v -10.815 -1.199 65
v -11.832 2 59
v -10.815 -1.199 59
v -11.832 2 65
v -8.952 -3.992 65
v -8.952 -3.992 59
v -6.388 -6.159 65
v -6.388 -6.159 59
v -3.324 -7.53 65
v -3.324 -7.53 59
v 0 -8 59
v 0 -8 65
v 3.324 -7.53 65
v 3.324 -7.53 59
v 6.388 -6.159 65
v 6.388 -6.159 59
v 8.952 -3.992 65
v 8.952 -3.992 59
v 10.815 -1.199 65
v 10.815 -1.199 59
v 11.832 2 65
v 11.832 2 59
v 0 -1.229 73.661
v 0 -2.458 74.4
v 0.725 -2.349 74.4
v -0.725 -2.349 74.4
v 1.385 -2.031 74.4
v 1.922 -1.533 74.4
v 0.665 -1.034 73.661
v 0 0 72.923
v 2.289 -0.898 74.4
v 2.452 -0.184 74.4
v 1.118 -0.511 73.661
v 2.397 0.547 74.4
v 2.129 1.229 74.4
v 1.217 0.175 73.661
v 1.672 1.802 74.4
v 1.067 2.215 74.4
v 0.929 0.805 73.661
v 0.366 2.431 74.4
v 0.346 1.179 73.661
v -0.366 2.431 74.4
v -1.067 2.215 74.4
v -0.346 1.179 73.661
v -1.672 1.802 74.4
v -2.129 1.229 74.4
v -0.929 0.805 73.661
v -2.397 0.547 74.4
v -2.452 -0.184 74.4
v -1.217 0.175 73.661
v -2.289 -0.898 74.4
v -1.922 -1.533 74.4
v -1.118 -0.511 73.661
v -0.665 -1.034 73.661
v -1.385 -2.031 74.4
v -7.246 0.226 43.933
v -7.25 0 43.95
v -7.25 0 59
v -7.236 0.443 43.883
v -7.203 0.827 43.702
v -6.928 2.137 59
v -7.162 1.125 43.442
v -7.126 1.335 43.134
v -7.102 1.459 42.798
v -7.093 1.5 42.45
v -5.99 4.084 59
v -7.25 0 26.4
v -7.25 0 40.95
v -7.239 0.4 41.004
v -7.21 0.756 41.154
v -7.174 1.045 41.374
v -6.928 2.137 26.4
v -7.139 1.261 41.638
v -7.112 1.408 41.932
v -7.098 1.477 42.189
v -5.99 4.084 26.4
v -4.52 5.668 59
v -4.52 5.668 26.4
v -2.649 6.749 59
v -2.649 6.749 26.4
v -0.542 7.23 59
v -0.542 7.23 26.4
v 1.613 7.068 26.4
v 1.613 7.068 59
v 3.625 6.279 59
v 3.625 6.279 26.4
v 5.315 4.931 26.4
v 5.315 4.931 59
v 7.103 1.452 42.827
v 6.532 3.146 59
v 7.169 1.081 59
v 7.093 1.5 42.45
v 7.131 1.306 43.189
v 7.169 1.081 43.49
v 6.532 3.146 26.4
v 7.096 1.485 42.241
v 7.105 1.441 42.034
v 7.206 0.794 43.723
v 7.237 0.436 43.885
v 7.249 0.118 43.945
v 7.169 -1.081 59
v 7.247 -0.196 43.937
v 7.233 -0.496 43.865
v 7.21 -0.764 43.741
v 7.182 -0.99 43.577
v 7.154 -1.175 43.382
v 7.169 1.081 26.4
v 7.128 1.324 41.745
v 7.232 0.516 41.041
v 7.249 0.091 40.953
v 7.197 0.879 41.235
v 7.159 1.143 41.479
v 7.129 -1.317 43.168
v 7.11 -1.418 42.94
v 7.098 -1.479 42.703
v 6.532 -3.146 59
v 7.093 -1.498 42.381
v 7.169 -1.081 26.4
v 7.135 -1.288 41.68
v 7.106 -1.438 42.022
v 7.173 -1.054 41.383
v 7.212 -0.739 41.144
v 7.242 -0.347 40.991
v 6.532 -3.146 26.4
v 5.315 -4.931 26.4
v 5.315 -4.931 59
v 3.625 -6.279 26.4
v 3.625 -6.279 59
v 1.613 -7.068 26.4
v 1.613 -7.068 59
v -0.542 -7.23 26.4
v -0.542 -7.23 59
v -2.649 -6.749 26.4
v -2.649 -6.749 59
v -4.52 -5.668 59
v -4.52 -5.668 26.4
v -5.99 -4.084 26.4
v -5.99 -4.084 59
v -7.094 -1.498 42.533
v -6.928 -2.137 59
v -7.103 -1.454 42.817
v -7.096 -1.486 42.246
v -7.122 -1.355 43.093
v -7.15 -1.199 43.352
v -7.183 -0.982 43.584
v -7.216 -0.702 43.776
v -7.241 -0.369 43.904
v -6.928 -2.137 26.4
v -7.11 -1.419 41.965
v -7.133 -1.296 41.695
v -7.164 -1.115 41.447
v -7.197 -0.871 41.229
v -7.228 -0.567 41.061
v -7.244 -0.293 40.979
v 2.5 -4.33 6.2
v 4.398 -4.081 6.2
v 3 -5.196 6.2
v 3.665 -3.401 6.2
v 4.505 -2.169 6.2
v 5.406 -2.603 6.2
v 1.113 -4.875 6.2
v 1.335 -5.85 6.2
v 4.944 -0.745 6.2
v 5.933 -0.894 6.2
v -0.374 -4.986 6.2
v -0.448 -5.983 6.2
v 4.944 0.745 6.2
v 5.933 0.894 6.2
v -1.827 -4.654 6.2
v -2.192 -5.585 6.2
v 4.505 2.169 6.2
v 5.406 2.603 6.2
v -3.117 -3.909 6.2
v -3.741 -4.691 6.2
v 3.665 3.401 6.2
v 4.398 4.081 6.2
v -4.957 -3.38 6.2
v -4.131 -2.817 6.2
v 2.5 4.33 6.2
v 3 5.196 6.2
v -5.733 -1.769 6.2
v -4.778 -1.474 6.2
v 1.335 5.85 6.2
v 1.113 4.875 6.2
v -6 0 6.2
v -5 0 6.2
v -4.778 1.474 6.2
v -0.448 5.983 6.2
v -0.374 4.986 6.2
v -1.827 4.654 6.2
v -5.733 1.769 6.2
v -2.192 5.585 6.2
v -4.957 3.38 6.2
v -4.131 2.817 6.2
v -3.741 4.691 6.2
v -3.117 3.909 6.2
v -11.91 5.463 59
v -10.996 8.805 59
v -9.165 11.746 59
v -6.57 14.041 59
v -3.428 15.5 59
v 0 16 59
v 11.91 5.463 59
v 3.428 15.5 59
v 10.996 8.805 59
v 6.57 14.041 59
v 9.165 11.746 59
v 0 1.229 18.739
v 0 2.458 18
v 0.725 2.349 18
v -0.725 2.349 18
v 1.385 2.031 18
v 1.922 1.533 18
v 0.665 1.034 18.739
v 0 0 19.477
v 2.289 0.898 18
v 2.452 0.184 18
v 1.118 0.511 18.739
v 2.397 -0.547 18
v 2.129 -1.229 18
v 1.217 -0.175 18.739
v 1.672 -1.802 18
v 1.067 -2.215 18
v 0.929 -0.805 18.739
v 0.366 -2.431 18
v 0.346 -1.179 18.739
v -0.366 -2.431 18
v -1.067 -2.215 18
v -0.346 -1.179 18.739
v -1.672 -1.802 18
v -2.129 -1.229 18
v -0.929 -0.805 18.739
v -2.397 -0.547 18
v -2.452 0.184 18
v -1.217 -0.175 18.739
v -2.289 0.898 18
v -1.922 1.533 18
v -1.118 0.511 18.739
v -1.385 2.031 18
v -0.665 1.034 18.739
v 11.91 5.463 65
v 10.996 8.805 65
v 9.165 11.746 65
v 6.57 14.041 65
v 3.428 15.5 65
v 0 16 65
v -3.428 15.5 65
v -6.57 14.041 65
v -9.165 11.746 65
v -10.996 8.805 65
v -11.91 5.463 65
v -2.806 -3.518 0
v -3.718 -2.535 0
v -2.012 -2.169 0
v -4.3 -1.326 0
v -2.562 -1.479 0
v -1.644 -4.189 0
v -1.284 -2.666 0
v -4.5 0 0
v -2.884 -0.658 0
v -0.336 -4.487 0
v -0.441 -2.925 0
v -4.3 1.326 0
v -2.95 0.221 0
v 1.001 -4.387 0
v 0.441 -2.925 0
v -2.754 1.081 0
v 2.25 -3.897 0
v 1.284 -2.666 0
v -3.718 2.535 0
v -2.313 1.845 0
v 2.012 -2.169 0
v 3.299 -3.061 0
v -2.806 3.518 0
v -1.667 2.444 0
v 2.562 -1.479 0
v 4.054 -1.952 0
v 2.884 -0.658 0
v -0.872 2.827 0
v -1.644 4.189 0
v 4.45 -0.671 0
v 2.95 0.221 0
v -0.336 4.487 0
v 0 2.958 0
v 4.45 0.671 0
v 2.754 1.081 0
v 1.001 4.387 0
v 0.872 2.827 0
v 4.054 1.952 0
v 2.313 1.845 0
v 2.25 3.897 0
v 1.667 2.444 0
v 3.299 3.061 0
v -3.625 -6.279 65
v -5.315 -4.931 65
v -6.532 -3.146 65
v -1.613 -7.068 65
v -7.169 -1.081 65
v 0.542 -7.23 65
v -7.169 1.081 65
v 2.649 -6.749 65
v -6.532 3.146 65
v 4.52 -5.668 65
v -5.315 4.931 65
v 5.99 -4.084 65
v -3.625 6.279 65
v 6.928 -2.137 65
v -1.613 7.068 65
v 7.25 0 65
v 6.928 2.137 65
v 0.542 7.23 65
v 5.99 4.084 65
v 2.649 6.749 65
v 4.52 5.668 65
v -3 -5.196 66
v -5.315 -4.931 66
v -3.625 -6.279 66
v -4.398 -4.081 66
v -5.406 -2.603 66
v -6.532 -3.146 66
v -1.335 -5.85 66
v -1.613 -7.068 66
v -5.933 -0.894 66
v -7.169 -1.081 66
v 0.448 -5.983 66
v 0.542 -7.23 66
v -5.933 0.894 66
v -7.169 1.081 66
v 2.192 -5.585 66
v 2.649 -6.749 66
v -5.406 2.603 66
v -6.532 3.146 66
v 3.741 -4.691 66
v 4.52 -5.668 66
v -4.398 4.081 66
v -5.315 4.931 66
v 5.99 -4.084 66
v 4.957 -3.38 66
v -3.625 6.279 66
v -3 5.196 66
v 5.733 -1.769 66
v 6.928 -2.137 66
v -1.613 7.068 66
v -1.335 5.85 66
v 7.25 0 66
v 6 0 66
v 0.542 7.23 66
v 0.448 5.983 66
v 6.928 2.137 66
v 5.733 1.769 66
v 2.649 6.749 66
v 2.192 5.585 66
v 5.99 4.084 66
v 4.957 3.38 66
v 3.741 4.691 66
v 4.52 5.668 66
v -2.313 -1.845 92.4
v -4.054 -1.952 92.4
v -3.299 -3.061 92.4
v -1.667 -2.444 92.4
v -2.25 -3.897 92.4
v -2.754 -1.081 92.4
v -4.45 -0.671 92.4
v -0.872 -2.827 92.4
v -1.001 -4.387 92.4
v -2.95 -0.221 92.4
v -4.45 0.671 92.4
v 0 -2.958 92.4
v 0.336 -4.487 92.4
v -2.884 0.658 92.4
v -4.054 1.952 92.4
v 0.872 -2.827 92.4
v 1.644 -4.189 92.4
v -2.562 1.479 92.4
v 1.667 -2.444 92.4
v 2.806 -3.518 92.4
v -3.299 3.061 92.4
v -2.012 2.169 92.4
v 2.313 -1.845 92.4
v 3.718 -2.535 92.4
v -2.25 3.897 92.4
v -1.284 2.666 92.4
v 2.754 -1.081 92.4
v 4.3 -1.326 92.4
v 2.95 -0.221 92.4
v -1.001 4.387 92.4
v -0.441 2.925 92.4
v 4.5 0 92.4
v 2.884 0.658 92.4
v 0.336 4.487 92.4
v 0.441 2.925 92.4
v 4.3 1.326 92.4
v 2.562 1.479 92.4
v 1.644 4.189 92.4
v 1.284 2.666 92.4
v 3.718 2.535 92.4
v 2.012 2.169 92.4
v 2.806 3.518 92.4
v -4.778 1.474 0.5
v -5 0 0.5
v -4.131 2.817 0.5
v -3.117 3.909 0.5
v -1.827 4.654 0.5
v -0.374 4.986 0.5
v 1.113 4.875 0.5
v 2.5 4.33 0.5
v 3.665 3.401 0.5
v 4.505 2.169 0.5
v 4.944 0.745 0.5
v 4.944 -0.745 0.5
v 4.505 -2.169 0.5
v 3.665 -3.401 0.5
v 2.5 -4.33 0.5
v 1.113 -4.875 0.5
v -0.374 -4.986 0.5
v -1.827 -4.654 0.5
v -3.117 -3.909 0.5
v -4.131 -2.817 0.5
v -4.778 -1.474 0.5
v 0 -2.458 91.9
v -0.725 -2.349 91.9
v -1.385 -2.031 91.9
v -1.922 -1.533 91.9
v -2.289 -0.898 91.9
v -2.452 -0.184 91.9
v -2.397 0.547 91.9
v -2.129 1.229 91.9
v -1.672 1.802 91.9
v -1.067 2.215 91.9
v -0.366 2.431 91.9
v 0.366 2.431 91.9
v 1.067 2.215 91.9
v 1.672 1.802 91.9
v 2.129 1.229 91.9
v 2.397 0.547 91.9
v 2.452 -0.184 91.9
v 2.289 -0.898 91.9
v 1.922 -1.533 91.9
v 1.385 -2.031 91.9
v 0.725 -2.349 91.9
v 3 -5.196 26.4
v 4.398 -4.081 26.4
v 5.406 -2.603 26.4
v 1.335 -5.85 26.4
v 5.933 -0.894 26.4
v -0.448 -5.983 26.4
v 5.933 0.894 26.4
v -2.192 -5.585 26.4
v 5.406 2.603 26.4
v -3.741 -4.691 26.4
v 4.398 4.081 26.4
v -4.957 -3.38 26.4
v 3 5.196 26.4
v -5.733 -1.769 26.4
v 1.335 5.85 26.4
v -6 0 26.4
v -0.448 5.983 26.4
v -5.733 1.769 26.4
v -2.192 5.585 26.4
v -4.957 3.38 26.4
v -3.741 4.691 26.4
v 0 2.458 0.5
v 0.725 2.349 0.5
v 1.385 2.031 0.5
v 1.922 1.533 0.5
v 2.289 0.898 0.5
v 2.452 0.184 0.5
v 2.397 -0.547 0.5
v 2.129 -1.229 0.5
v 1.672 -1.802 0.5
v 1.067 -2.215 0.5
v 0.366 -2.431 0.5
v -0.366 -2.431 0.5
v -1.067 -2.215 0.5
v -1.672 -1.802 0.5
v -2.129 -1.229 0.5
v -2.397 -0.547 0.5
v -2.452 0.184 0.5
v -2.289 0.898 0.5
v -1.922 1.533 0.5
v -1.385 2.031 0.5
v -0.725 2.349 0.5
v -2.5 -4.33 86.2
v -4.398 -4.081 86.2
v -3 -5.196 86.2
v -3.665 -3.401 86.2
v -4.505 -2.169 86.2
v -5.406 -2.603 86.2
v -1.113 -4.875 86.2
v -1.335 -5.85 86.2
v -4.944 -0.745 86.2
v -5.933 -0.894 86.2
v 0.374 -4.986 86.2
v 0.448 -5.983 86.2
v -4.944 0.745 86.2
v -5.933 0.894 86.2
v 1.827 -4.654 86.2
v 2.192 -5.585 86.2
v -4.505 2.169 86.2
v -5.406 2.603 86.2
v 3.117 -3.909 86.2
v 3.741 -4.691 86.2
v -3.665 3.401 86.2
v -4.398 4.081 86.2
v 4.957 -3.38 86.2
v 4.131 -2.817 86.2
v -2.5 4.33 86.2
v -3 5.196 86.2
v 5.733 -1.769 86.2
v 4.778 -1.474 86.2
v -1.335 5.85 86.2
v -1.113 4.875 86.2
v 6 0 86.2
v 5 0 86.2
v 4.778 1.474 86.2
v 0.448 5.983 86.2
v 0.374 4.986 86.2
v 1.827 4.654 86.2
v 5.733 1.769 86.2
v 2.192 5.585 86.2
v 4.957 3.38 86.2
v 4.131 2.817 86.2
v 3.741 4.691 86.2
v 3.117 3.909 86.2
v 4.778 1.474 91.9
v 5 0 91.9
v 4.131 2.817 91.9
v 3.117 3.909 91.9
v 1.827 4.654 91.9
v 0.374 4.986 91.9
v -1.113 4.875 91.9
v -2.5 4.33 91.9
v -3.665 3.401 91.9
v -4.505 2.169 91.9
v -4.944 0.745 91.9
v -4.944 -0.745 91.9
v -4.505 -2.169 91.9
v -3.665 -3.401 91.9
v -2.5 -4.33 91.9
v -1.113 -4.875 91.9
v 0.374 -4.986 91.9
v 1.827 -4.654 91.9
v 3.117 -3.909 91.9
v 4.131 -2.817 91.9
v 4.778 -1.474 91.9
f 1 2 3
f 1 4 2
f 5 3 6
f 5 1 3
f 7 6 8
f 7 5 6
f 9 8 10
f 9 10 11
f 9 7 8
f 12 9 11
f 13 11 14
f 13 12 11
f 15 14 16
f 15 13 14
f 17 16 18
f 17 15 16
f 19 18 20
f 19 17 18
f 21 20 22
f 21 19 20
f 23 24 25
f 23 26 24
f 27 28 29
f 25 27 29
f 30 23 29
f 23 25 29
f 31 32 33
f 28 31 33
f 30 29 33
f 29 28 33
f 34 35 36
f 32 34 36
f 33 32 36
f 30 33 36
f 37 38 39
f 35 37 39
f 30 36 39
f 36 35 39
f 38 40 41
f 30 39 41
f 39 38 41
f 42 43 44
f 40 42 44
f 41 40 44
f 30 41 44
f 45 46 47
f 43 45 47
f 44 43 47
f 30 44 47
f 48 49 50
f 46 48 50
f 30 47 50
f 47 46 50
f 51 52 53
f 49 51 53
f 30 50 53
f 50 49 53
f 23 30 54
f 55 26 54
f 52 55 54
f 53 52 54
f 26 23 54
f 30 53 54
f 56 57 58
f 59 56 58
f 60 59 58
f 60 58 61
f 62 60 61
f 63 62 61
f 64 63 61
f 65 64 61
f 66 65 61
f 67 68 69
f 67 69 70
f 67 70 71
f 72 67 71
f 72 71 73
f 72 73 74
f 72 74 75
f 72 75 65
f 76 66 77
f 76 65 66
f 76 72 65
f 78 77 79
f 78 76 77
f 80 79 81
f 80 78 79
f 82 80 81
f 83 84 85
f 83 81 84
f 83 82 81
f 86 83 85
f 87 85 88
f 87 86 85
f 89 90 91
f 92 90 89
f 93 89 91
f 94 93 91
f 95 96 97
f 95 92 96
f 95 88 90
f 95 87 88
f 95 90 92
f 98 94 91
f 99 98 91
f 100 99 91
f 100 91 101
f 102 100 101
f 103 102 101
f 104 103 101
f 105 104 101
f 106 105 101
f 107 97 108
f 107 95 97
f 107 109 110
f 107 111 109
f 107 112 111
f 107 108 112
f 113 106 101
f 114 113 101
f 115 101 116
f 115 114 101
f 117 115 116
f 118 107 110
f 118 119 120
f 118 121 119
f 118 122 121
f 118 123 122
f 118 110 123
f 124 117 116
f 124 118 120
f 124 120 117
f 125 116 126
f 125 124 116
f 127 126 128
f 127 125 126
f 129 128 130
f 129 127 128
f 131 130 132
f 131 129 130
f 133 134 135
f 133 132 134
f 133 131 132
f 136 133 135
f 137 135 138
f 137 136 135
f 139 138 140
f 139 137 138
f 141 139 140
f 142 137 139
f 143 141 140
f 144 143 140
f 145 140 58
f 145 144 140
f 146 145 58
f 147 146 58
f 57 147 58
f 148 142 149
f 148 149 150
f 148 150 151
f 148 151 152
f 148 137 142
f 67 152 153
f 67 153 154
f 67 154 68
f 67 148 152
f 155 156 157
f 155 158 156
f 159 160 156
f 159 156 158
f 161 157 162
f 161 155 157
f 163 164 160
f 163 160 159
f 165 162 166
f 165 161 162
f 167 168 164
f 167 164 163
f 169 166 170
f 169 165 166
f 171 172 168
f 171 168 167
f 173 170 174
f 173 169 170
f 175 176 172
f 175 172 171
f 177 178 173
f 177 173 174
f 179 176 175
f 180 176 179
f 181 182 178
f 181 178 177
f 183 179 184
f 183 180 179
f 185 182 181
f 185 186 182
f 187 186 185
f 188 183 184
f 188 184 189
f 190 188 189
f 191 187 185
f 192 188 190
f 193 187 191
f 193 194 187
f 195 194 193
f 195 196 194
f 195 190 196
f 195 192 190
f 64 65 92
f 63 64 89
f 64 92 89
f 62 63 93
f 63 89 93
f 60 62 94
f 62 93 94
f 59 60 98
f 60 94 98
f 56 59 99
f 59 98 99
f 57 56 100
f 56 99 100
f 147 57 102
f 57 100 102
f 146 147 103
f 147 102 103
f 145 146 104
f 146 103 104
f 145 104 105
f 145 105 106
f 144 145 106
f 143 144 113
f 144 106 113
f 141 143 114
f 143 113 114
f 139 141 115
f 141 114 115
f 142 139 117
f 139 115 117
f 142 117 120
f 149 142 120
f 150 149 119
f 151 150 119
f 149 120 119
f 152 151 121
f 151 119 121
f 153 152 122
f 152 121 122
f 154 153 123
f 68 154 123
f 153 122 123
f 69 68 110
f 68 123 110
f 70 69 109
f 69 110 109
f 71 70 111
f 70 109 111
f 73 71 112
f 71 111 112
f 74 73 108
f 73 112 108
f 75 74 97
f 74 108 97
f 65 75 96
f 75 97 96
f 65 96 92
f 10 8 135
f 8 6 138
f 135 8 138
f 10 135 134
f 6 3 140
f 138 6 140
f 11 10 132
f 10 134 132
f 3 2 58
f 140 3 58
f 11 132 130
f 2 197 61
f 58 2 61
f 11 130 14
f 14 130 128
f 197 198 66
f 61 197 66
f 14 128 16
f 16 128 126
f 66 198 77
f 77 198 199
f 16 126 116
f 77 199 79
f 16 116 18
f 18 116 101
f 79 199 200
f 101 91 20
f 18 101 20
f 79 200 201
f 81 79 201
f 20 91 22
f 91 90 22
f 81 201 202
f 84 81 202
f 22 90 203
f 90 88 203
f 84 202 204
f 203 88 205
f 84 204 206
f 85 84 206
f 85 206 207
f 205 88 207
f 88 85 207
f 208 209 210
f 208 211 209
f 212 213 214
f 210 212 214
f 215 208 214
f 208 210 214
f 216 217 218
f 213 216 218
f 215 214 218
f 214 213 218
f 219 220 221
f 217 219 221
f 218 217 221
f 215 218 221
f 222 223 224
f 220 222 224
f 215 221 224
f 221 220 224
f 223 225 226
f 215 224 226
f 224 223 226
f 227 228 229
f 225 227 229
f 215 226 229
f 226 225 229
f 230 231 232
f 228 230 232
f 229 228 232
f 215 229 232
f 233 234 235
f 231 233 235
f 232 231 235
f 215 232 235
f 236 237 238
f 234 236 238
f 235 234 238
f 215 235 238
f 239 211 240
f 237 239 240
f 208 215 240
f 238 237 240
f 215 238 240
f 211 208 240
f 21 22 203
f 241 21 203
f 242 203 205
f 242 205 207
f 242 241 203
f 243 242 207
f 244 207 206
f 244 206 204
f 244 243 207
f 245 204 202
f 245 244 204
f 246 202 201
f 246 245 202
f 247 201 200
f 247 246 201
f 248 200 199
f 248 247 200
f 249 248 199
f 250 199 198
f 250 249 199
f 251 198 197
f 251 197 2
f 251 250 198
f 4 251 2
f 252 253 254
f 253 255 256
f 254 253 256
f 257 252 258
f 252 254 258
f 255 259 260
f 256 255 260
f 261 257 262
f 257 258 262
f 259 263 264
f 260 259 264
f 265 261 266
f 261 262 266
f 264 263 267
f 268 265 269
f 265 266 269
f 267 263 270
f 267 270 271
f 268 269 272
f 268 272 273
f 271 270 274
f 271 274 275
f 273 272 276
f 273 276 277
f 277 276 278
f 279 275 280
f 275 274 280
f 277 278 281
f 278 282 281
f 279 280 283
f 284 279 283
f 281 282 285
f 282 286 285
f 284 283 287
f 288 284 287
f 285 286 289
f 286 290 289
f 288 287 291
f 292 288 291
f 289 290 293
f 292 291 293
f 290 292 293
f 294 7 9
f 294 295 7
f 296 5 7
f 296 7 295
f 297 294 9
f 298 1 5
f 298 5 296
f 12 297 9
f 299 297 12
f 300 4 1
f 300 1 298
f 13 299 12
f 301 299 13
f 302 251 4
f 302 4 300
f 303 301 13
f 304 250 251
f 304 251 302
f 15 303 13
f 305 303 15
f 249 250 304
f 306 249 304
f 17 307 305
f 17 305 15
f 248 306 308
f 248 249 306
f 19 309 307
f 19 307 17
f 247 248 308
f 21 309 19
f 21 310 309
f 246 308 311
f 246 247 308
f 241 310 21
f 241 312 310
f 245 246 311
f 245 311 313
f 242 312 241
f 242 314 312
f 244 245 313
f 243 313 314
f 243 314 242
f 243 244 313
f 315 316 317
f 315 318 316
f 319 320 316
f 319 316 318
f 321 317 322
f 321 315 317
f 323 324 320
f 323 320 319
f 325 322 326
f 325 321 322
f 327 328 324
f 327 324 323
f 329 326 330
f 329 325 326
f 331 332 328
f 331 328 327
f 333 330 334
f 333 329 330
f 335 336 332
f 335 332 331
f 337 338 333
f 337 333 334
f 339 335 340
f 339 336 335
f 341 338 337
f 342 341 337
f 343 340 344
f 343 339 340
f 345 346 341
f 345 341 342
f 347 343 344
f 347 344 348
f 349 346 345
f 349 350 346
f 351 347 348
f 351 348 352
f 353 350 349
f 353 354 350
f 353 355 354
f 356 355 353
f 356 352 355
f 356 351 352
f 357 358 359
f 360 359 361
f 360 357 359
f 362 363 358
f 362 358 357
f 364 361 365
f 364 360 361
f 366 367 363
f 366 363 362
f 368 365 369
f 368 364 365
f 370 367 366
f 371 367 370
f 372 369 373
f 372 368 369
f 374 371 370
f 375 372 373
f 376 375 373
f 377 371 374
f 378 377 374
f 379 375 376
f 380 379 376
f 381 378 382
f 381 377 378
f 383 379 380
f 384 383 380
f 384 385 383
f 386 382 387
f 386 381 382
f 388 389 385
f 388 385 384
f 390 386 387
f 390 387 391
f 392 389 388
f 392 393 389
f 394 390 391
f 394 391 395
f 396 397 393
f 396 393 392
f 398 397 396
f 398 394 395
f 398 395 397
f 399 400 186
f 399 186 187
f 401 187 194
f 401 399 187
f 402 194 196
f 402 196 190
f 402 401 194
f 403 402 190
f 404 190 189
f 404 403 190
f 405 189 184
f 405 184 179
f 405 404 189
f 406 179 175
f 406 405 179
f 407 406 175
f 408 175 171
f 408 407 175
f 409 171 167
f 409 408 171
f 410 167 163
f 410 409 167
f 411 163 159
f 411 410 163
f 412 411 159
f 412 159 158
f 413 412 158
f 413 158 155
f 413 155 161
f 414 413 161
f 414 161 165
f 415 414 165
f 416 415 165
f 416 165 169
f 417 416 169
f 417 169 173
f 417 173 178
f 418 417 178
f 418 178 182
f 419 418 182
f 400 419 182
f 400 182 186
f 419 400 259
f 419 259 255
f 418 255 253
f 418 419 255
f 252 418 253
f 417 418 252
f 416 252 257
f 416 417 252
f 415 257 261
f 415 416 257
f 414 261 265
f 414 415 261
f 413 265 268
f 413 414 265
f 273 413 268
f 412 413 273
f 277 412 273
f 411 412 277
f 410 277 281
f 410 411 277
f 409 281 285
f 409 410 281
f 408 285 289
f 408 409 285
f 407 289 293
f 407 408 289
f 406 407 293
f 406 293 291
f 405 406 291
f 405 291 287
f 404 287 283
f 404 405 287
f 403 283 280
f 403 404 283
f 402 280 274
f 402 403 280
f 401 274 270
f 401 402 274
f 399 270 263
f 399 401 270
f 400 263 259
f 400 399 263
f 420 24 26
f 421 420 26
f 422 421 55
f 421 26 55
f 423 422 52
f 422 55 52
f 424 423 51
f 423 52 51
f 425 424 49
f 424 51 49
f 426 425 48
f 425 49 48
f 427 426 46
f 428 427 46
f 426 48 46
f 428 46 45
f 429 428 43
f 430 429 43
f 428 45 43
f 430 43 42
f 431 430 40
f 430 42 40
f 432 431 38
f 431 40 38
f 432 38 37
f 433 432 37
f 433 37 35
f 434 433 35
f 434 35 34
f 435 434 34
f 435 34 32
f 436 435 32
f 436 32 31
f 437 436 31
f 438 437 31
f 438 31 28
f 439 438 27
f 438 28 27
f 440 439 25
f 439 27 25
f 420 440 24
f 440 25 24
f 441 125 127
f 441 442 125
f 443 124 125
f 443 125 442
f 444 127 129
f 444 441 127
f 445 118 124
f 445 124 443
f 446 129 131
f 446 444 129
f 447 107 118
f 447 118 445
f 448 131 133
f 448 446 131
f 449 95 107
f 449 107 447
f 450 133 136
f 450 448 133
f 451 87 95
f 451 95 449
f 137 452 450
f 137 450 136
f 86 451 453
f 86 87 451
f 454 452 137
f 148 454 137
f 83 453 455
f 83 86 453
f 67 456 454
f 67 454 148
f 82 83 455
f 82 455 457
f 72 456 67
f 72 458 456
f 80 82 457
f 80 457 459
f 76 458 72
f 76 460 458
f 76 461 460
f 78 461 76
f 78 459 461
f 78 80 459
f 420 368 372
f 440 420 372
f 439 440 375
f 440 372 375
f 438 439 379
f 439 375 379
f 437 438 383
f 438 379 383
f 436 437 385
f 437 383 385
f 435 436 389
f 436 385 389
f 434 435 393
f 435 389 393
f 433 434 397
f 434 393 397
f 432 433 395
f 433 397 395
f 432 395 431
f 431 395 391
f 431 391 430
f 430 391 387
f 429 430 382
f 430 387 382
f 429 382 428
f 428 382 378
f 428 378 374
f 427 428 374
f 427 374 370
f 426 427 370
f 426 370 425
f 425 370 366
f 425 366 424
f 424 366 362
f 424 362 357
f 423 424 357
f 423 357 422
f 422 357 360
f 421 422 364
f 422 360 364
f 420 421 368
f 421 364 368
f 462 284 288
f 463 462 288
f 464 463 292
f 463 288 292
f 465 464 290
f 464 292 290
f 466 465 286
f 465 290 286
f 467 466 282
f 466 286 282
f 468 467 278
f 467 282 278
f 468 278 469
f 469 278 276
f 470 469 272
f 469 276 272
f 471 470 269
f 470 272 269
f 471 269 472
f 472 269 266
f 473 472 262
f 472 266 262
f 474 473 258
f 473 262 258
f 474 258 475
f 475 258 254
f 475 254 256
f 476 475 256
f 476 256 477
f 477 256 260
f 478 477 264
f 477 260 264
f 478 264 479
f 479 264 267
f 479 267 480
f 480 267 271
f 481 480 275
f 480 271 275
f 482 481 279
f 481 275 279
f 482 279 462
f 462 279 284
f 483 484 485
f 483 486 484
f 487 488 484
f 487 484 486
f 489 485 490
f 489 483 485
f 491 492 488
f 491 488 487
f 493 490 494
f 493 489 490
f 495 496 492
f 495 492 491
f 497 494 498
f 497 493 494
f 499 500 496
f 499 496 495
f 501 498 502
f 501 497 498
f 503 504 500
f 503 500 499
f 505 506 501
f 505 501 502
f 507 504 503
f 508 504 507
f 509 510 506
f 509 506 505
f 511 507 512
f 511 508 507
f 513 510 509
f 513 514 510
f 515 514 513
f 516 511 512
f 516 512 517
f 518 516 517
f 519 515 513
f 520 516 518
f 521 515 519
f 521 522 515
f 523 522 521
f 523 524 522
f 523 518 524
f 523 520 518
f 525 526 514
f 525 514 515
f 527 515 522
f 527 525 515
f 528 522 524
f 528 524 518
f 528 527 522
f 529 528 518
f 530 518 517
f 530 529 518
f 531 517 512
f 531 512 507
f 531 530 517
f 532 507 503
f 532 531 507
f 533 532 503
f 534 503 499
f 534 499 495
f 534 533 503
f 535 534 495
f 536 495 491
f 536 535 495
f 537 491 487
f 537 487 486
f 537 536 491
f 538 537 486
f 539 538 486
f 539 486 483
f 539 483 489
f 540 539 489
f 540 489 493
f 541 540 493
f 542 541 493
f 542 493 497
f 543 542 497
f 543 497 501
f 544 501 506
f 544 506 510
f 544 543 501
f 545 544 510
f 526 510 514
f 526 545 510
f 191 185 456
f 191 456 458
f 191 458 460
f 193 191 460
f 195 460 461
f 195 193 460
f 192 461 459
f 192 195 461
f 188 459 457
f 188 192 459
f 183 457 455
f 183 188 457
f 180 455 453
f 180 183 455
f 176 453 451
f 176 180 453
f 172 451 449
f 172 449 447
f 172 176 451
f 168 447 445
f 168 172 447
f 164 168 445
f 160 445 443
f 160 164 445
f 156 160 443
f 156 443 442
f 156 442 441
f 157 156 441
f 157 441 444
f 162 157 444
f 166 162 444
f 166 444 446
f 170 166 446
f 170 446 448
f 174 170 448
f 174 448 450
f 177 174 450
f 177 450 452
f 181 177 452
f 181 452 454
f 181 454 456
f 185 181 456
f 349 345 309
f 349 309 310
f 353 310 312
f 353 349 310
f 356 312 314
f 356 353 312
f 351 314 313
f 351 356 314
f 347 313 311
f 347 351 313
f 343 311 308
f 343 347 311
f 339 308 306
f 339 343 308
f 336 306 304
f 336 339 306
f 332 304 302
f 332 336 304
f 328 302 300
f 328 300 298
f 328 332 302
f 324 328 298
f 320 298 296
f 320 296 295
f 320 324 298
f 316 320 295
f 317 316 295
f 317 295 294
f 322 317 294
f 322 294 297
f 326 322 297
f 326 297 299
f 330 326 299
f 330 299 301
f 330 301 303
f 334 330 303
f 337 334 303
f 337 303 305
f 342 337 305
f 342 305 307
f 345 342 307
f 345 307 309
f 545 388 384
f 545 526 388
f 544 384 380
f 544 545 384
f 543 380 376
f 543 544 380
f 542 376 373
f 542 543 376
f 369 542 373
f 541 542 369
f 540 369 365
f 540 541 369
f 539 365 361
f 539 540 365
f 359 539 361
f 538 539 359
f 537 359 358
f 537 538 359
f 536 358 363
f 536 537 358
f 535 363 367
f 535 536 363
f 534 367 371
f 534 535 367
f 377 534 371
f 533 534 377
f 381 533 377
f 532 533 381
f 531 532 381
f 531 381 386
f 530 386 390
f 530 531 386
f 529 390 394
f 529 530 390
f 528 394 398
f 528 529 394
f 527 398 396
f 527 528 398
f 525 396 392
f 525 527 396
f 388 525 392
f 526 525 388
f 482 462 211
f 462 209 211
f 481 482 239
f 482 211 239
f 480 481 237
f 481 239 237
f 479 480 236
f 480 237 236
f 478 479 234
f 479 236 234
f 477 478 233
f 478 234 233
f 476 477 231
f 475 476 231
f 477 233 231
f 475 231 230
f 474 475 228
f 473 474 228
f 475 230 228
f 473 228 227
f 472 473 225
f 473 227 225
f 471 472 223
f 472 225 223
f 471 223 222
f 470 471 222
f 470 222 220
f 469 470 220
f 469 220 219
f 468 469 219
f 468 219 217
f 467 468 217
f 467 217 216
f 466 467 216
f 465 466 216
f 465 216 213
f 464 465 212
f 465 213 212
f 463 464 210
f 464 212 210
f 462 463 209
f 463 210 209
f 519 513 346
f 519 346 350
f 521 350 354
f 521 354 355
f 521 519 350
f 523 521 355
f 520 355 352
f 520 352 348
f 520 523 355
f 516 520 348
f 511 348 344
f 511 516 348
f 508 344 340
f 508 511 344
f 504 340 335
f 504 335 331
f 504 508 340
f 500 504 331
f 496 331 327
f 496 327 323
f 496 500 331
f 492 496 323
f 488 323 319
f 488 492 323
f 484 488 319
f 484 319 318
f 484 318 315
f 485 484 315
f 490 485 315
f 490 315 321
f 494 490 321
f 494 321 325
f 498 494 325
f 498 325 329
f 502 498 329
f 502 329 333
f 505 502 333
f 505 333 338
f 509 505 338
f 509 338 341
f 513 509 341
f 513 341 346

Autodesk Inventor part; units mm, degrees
ref_plane "YZ Plane" through (0, 0, 0) normal (1, 0, 0) x (0, 1, 0)
ref_plane "XZ Plane" through (0, 0, 0) normal (0, 1, 0) x (-1, 0, 0)
ref_plane "XY Plane" through (0, 0, 0) normal (0, 0, 1) x (1, 0, 0)
sketch "Sketch1" plane through (0, 0, 0) normal (0, 0, 1) x (1, 0, 0)
  circle A0 centre (0, 0) radius 12
  dimension "d0" = 24
extrude "Extrusion1" add sketch "Sketch1" along normal blind 92.4
sketch "Sketch2" plane through (0, 0, 92.4) normal (0, 0, 1) x (1, 0, 0)
  circle A0 centre (0, 0) radius 12 projected
  circle A1 centre (0, 0) radius 5
  dimension "d3" = 10
extrude "Extrusion2" cut sketch "Sketch2" against normal blind 6.2
sketch "Sketch3" plane through (0, 0, 86.2) normal (0, 0, 1) x (1, 0, 0)
  circle A0 centre (0, 0) radius 12 projected
  circle A1 centre (0, 0) radius 6
  dimension "d6" = 12
extrude "Extrusion3" cut sketch "Sketch3" against normal blind 20.2
sketch "Sketch4" plane through (0, 0, 66) normal (0, 0, 1) x (1, 0, 0)
  circle A0 centre (0, 0) radius 12 projected
  circle A1 centre (0, 0) radius 7.25
  dimension "d9" = 14.5
extrude "Extrusion4" cut sketch "Sketch4" against normal blind 1
sketch "Sketch5" plane through (0, 0, 0) normal (0, 0, -1) x (-1, 0, 0)
  circle A0 centre (0, 0) radius 12 projected
  circle A1 centre (0, 0) radius 6
  dimension "d12" = 0
  dimension "d13" = 12
extrude "Extrusion5" cut sketch "Sketch5" against normal blind 26.4
sketch "Sketch6" plane through (0, 0, 0) normal (0, 0, -1) x (-1, 0, 0)
  circle A0 centre (0, 0) radius 6 projected
  circle A1 centre (0, 0) radius 5
  dimension "d16" = 10
extrude "Extrusion6" cut sketch "Sketch6" against normal blind 6.2
sketch "Sketch7" plane through (0, 0, 26.4) normal (0, 0, -1) x (-1, 0, 0)
  circle A0 centre (0, 0) radius 6 projected
  circle A1 centre (0, 0) radius 12 projected
  circle A2 centre (0, 0) radius 7.25
  dimension "d19" = 14.5
extrude "Extrusion7" cut sketch "Sketch7" against normal blind 32.6 contours A1
sketch "Sketch8" plane through (0, 0, 0) normal (0, 0, -1) x (-1, 0, 0)
  circle A0 centre (0, 0) radius 5 projected
hole "Hole1" at (0, 0, 0) direction (0, 0, 1) diameter 4.917 depth 18 tip angle 118 thread size "M6x1" class "6H" standard "ANSI Metric M Profile"
chamfer "Chamfer1" distance 0.5 angle 45 1 edges at (0, -2.4585, 0)
sketch "Sketch9" plane through (0, 0, 92.4) normal (0, 0, 1) x (1, 0, 0)
  circle A0 centre (0, 0) radius 5 projected
hole "Hole2" at (0, 0, 92.4) direction (0, 0, -1) diameter 4.917 depth 18 tip angle 118 thread size "M6x1" class "6H" standard "ANSI Metric M Profile"
chamfer "Chamfer2" distance 0.5 angle 45 1 edges at (0, 2.4585, 92.4)
chamfer "Chamfer3" distance 0.5 angle 45 2 edges at (-5, 0, 92.4) (5, 0, 0)
sketch "Sketch10" plane through (0, 0, 65) normal (0, 0, 1) x (1, 0, 0)
  circle A0 centre (0, 0) radius 7.25 projected
  circle A1 centre (0, 4) radius 12
  dimension "d46" = 24
  dimension "d47" = 4
extrude "Extrusion8" add sketch "Sketch10" against normal blind 6
sketch "Sketch11" plane through (0, 0, 65) normal (0, 0, 1) x (1, 0, 0)
  arc A0 (-11.8322, 2) -> (11.8322, 2) centre (0, 0) ccw projected
  arc A1 (11.8322, 2) -> (-11.8322, 2) centre (0, 4) ccw projected
  circle A2 centre (0, 4) radius 12
extrude "Extrusion9" cut sketch "Sketch11" against normal blind 6 contours A2 A0
sketch "Sketch13" plane through (0, 0, 0) normal (1, 0, 0) x (0, 1, 0)
  circle A0 centre (0, 42.45) radius 1.5
  line L0 (-8, 59) -> (16, 59) projected
  line L1 (-7.25, 59) -> (7.25, 59) projected
  line L2 (-7.25, 26.4) -> (7.25, 26.4) projected
  point P0 (0, 0)
  dimension "d56" = 3
  dimension "d57" = 16.55
extrude "Extrusion11" cut sketch "Sketch13" along normal mid plane 20
properties part number "EIXO EXCÊNTRICO(53)" material "Carbon Steel"
